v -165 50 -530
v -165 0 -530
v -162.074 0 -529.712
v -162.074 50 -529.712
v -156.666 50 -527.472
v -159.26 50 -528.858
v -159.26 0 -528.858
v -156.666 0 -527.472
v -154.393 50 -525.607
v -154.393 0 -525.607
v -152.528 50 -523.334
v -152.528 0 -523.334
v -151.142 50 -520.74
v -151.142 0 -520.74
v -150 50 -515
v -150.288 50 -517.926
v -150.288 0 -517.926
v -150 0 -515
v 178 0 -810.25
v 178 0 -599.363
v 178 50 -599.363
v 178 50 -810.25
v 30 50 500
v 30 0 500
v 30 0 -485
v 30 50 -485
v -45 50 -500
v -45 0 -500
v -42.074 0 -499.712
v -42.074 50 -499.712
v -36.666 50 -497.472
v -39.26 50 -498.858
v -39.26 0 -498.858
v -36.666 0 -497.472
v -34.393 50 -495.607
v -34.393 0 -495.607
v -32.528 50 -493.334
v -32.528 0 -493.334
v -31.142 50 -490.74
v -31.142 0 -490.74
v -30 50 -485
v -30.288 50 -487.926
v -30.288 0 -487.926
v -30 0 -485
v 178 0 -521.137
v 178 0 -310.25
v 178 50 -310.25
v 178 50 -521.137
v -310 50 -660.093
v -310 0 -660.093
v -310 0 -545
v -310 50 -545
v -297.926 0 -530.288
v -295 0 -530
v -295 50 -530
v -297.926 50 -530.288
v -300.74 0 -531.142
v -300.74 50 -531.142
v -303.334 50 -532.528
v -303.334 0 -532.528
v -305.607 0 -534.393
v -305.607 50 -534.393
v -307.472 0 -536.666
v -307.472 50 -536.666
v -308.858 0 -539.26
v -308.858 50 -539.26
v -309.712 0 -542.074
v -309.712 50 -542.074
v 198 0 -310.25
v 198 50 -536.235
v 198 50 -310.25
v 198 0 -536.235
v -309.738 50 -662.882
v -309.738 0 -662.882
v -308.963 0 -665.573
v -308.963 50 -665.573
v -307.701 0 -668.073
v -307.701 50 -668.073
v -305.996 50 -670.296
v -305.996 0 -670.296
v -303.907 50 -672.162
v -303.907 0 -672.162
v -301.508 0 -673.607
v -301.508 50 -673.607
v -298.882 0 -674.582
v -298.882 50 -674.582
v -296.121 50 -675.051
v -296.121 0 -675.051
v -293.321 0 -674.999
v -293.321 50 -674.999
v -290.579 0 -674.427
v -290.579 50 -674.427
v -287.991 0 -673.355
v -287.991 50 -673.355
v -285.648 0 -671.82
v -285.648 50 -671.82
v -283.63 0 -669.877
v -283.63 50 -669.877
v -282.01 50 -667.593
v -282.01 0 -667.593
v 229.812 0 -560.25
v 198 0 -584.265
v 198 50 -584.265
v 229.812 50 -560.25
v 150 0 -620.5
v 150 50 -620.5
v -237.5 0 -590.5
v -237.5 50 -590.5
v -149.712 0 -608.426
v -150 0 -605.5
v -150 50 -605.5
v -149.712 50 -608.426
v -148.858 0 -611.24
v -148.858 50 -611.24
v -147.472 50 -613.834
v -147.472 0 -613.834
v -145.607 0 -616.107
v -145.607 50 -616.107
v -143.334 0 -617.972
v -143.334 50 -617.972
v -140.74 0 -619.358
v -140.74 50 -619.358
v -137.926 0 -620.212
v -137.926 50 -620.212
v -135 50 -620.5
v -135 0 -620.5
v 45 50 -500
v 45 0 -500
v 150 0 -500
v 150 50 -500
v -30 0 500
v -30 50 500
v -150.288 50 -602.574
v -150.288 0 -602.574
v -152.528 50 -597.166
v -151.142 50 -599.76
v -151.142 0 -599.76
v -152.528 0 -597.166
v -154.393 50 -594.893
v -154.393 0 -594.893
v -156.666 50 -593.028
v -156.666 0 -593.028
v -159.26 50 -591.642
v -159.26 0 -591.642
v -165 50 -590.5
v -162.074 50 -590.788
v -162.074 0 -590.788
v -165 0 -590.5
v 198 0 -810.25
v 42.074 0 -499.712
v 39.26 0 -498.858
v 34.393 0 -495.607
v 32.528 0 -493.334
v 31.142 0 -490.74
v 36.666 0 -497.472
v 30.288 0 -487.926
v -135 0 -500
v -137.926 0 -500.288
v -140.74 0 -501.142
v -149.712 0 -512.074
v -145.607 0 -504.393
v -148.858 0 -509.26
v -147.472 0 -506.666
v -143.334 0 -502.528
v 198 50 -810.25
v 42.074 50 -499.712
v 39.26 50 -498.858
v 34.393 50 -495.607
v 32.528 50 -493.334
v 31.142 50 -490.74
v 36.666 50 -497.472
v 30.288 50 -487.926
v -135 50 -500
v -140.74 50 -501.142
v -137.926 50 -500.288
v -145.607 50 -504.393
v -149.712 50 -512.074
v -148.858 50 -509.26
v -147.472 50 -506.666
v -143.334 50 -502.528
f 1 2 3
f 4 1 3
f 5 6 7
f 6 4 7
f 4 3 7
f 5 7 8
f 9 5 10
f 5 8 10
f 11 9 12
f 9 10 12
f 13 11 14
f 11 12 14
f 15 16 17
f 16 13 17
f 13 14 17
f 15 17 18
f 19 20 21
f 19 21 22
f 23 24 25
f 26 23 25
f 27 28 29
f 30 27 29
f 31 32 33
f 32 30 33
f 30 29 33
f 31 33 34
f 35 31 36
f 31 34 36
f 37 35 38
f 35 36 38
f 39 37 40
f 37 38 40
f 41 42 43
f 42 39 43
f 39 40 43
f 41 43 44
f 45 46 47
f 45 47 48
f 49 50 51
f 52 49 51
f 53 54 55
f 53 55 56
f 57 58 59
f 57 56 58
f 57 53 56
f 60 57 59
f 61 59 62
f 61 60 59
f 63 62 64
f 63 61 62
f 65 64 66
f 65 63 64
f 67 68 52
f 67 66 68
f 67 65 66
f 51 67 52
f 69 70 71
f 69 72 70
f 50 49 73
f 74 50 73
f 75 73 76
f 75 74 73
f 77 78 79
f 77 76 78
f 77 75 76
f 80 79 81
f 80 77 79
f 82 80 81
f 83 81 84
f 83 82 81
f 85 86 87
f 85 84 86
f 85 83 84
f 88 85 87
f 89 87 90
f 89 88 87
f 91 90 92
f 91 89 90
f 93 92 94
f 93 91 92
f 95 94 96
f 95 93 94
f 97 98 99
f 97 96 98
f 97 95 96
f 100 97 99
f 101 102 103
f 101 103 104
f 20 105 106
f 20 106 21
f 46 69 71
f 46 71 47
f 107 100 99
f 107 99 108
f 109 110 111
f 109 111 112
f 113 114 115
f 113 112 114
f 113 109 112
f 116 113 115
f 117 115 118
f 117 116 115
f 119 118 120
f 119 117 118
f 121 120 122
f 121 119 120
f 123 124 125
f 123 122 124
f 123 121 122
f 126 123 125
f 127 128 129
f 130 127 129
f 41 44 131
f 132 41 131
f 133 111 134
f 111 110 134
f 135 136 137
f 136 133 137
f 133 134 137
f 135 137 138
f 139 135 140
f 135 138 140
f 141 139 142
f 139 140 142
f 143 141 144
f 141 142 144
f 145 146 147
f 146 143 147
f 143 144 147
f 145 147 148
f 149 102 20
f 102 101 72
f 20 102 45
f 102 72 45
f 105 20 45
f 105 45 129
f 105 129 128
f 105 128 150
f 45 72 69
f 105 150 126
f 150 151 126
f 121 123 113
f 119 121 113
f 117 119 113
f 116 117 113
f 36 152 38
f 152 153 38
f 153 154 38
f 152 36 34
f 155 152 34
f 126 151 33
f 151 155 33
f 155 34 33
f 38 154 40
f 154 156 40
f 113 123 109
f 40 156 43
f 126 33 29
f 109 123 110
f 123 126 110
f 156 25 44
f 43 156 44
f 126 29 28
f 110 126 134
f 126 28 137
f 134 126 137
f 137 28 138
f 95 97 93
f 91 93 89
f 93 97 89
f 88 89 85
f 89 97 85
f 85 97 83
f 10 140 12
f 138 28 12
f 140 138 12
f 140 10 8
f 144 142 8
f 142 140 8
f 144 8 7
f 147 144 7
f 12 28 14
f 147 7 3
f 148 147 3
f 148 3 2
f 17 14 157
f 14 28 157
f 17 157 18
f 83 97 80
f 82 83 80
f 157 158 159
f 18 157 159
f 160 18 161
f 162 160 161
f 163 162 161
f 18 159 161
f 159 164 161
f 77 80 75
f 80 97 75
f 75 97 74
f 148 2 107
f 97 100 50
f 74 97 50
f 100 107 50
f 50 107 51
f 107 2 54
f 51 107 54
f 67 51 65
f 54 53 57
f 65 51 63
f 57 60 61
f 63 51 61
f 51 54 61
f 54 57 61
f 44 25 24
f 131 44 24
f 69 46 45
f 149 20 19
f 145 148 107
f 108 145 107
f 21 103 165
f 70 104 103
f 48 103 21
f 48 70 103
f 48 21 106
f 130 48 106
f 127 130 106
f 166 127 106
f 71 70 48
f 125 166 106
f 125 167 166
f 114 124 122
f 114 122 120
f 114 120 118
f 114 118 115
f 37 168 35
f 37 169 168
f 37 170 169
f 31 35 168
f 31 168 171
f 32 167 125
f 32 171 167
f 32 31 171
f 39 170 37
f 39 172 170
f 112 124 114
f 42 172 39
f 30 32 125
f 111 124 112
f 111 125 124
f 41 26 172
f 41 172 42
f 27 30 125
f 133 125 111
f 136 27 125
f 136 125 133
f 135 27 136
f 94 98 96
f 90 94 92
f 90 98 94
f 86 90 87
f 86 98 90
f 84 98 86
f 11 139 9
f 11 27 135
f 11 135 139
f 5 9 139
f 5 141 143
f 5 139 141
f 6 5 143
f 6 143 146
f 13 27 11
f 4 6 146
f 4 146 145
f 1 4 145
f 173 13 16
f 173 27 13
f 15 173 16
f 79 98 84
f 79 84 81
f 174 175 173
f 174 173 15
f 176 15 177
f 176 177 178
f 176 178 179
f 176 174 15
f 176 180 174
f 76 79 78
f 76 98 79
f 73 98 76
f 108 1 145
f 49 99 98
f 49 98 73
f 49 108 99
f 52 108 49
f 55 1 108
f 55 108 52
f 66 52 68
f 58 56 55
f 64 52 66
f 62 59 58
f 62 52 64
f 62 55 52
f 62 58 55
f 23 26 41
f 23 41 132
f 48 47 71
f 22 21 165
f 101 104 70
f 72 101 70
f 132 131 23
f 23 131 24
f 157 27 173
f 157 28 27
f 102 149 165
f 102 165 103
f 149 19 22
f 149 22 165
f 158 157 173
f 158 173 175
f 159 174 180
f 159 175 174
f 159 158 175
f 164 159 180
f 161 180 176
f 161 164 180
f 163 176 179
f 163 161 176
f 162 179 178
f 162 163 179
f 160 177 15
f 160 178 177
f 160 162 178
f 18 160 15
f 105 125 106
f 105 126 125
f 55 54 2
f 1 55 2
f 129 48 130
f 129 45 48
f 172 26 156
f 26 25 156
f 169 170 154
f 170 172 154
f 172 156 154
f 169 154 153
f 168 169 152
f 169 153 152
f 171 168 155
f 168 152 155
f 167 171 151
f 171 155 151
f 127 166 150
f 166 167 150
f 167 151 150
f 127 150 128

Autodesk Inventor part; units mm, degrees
ref_plane "YZ Plane" through (0, 0, 0) normal (1, 0, 0) x (0, 1, 0)
ref_plane "XZ Plane" through (0, 0, 0) normal (0, 1, 0) x (-1, 0, 0)
ref_plane "XY Plane" through (0, 0, 0) normal (0, 0, 1) x (1, 0, 0)
sketch "Náčrt1" plane through (0, 0, 0) normal (0, 1, 0) x (-1, 0, 0)
  line L0 (30, -485) -> (30, 500)
  line L1 (30, 500) -> (-30, 500)
  line L2 (-30, 500) -> (-30, -485)
  line L3 (-338.3956, 0) -> (421.6903, 0) projected
  line L4 (0, -1072.3) -> (0, 762.05) projected
  line L5 (45, -500) -> (135, -500)
  line L6 (150, -605.5) -> (150, -605.5)
  line L7 (135, -620.5) -> (-150, -620.5)
  line L8 (-150, -620.5) -> (-150, -500)
  line L9 (-178, -810.25) -> (-198, -810.25)
  line L10 (-198, -810.25) -> (-198, -310.25)
  line L11 (-198, -310.25) -> (-178, -310.25)
  line L12 (-178, -310.25) -> (-178, -810.25)
  line L13 (-150, -620.5) -> (-229.8119, -560.25)
  line L14 (-229.8119, -560.25) -> (-150, -500)
  line L15 (165, -590.5) -> (310, -590.5)
  line L16 (310, -590.5) -> (310, -545)
  line L17 (295, -530) -> (165, -530)
  line L18 (310, -590.5) -> (310, -660.0929)
  line L19 (282.0096, -667.5929) -> (237.5, -590.5)
  arc A0 (135, -620.5) -> (150, -605.5) centre (135, -605.5) ccw
  arc A1 (165, -590.5) -> (150, -605.5) centre (165, -605.5) ccw
  line L20 (150, -515) -> (150, -515)
  arc A2 (150, -515) -> (135, -500) centre (135, -515) ccw
  arc A3 (150, -515) -> (165, -530) centre (165, -515) ccw
  arc A4 (310, -545) -> (295, -530) centre (295, -545) ccw
  arc A5 (30, -485) -> (45, -500) centre (45, -485) ccw
  line L21 (-45, -500) -> (-150, -500)
  arc A6 (-45, -500) -> (-30, -485) centre (-45, -485) ccw
  line L22 (45, -500) -> (-45, -500)
  arc A7 (282.0096, -667.5929) -> (310, -660.0929) centre (295, -660.0929) ccw
  point P0 (0, 0)
  point P1 (150, -620.5)
  point P2 (150, -500)
  point P3 (310, -530)
  point P4 (150, -530)
  point P5 (-178, -521.1372)
  point P6 (-198, -536.2352)
  point P7 (-198, -584.2648)
  point P8 (-178, -599.3628)
  dimension "d0" = 60
  dimension "d2" = 300
  dimension "d3" = 120.5
  dimension "d4" = 20
  dimension "d5" = 500
  dimension "d7" = 189.75
  dimension "d9" = 100
  dimension "d11" = 100
  dimension "d12" = 178
  dimension "d13" = 160
  dimension "d14" = 30
  dimension "d15" = 30
  dimension "d16" = 30
  dimension "d17" = 15
  dimension "d18" = 15
  dimension "d19" = 15
  dimension "d20" = 15
  dimension "d21" = 15
  dimension "d22" = 1000
  dimension "d23" = 15
extrude "Vysunutí1" add sketch "Náčrt1" along normal blind 50
properties part number "Náčrt"
